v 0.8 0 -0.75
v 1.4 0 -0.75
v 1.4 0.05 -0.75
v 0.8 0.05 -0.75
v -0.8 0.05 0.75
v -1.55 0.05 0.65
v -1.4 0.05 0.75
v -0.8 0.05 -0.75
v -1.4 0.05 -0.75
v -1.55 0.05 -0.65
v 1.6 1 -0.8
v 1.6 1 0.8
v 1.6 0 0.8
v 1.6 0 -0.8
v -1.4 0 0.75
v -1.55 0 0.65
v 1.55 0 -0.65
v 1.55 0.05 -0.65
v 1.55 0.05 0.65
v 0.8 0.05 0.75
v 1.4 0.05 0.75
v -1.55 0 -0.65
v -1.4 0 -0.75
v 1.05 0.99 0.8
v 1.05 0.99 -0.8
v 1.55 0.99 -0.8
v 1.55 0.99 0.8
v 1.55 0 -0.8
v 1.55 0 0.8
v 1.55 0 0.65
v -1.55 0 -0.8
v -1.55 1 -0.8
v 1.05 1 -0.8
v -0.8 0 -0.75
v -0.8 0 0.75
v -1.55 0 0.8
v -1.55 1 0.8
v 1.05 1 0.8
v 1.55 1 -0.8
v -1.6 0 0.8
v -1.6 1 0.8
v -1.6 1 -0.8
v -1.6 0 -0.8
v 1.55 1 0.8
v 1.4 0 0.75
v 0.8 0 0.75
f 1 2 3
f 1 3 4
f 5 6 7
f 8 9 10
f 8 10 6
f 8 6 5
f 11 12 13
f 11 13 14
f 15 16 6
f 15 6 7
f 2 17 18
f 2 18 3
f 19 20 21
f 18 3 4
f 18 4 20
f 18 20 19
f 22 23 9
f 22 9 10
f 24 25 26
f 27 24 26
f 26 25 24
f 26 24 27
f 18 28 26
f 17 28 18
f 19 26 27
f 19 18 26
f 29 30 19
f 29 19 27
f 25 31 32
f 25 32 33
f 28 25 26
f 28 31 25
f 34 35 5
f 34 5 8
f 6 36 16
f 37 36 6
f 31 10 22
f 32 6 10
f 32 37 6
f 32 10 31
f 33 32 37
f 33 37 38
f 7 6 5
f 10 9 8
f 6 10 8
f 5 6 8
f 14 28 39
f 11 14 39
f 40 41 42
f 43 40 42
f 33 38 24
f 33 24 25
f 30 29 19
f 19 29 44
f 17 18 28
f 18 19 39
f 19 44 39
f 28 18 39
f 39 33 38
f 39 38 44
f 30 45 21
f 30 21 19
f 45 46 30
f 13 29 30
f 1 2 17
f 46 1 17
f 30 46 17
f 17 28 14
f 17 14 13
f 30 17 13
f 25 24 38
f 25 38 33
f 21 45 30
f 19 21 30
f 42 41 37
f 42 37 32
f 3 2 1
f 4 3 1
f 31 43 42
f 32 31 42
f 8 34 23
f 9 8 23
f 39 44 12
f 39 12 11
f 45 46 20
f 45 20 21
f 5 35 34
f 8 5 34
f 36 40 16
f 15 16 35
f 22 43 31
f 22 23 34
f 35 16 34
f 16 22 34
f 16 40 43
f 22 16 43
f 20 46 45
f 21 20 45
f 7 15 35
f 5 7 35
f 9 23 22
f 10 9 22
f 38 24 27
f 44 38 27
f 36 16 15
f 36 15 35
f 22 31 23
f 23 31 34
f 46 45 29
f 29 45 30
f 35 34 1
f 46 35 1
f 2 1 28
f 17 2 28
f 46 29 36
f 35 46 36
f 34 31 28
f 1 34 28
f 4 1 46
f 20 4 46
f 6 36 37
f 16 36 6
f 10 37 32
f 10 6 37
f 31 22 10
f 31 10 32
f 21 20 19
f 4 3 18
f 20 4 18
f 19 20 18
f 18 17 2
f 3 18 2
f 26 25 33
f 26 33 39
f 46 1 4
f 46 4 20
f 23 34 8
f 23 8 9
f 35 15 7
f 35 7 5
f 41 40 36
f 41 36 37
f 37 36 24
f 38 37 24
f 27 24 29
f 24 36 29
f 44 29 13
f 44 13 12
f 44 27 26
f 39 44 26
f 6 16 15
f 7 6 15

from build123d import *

# Parameters (mm, degrees)
SKETCH1_W             = 3.2
SKETCH1_H             = 1.6
BOSS_EXTRUDE1_DEPTH   = 1
CUT_EXTRUDE2_DEPTH    = 0.05
BOSS_EXTRUDE2_DEPTH   = 0.05
BOSS_EXTRUDE2_2_DEPTH = 0.05
CUT_EXTRUDE3_START    = 1.6
SKETCH3_W             = 1.6
SKETCH3_H             = 0.95
CUT_EXTRUDE3_DEPTH    = 0.05
BOSS_EXTRUDE3_START   = 1.55
SKETCH3_2_W           = 1.6
SKETCH3_2_H           = 0.95
BOSS_EXTRUDE3_DEPTH   = 0.05
CUT_EXTRUDE4_START    = -1.6
SKETCH3_3_W           = 1.6
SKETCH3_3_H           = 0.95
CUT_EXTRUDE4_DEPTH    = 0.05
BOSS_EXTRUDE4_START   = -1.6
SKETCH3_4_W           = 1.6
SKETCH3_4_H           = 0.95
BOSS_EXTRUDE4_DEPTH   = 0.05
CUT_EXTRUDE5_START    = 1
SKETCH5_W             = 0.5
SKETCH5_H             = 1.6
CUT_EXTRUDE5_DEPTH    = 0.01
BOSS_EXTRUDE5_START   = 0.99
SKETCH5_2_W           = 0.5
SKETCH5_2_H           = 1.6
BOSS_EXTRUDE5_DEPTH   = 0.01


with BuildPart() as part:
    # Sketch1 → Boss-Extrude1 (new body)
    with BuildSketch(Plane(origin=(0, 0, 0), x_dir=(1, 0, 0), z_dir=(0, 1, 0))):
        Rectangle(SKETCH1_W, SKETCH1_H)
    extrude(amount=BOSS_EXTRUDE1_DEPTH)

    # Sketch2 → Cut-Extrude2 (cut)
    with BuildSketch(Plane(origin=(0, 0, 0), x_dir=(1, 0, 0), z_dir=(0, 1, 0))):
        Polygon((-0.8, -0.75), (-0.8, 0.75), (-1.4, 0.75), (-1.55, 0.65), (-1.55, 0.8), (-1.6, 0.8), (-1.6, -0.8), (-1.55, -0.8), (-1.55, -0.65), (-1.4, -0.75), align=None)
        Polygon((1.55, 0.65), (1.4, 0.75), (0.8, 0.75), (0.8, -0.75), (1.4, -0.75), (1.55, -0.65), (1.55, -0.8), (1.6, -0.8), (1.6, 0.8), (1.55, 0.8), align=None)
    extrude(amount=CUT_EXTRUDE2_DEPTH, mode=Mode.SUBTRACT)

    # Sketch3 → Cut-Extrude3 (cut)
    with BuildSketch(Plane(origin=(0, 0, 0), x_dir=(0, 0, -1), z_dir=(1, 0, 0)).offset(CUT_EXTRUDE3_START)):
        with Locations((0, 0.525)):
            Rectangle(SKETCH3_W, SKETCH3_H)
    extrude(amount=-CUT_EXTRUDE3_DEPTH, mode=Mode.SUBTRACT)

    # Sketch3<3> → Cut-Extrude4 (cut)
    with BuildSketch(Plane(origin=(0, 0, 0), x_dir=(0, 0, -1), z_dir=(1, 0, 0)).offset(CUT_EXTRUDE4_START)):
        with Locations((0, 0.525)):
            Rectangle(SKETCH3_3_W, SKETCH3_3_H)
    extrude(amount=CUT_EXTRUDE4_DEPTH, mode=Mode.SUBTRACT)

    # Sketch5 → Cut-Extrude5 (cut)
    with BuildSketch(Plane(origin=(0, 0, 0), x_dir=(1, 0, 0), z_dir=(0, 1, 0)).offset(CUT_EXTRUDE5_START)):
        with Locations((1.3, 0)):
            Rectangle(SKETCH5_W, SKETCH5_H)
    extrude(amount=-CUT_EXTRUDE5_DEPTH, mode=Mode.SUBTRACT)


with BuildPart() as body_2:
    # Sketch2<2> → Boss-Extrude2 (new body)
    with BuildSketch(Plane(origin=(0, 0, 0), x_dir=(1, 0, 0), z_dir=(0, 1, 0))):
        Polygon((-0.8, -0.75), (-0.8, 0.75), (-1.4, 0.75), (-1.55, 0.65), (-1.55, 0.8), (-1.6, 0.8), (-1.6, -0.8), (-1.55, -0.8), (-1.55, -0.65), (-1.4, -0.75), align=None)
    extrude(amount=BOSS_EXTRUDE2_DEPTH)

    # Sketch3<4> → Boss-Extrude4 (add)
    with BuildSketch(Plane(origin=(0, 0, 0), x_dir=(0, 0, -1), z_dir=(1, 0, 0)).offset(BOSS_EXTRUDE4_START)):
        with Locations((0, 0.525)):
            Rectangle(SKETCH3_4_W, SKETCH3_4_H)
    extrude(amount=BOSS_EXTRUDE4_DEPTH)


with BuildPart() as body_3:
    # Sketch2<2> → Boss-Extrude2 2 (new body)
    with BuildSketch(Plane(origin=(0, 0, 0), x_dir=(1, 0, 0), z_dir=(0, 1, 0))):
        Polygon((1.55, 0.65), (1.4, 0.75), (0.8, 0.75), (0.8, -0.75), (1.4, -0.75), (1.55, -0.65), (1.55, -0.8), (1.6, -0.8), (1.6, 0.8), (1.55, 0.8), align=None)
    extrude(amount=BOSS_EXTRUDE2_2_DEPTH)

    # Sketch3<2> → Boss-Extrude3 (add)
    with BuildSketch(Plane(origin=(0, 0, 0), x_dir=(0, 0, -1), z_dir=(1, 0, 0)).offset(BOSS_EXTRUDE3_START)):
        with Locations((0, 0.525)):
            Rectangle(SKETCH3_2_W, SKETCH3_2_H)
    extrude(amount=BOSS_EXTRUDE3_DEPTH)


with BuildPart() as body_4:
    # Sketch5<2> → Boss-Extrude5 (new body)
    with BuildSketch(Plane(origin=(0, 0, 0), x_dir=(1, 0, 0), z_dir=(0, 1, 0)).offset(BOSS_EXTRUDE5_START)):
        with Locations((1.3, 0)):
            Rectangle(SKETCH5_2_W, SKETCH5_2_H)
    extrude(amount=BOSS_EXTRUDE5_DEPTH)


solid = Compound([part.part, body_2.part, body_3.part, body_4.part])
